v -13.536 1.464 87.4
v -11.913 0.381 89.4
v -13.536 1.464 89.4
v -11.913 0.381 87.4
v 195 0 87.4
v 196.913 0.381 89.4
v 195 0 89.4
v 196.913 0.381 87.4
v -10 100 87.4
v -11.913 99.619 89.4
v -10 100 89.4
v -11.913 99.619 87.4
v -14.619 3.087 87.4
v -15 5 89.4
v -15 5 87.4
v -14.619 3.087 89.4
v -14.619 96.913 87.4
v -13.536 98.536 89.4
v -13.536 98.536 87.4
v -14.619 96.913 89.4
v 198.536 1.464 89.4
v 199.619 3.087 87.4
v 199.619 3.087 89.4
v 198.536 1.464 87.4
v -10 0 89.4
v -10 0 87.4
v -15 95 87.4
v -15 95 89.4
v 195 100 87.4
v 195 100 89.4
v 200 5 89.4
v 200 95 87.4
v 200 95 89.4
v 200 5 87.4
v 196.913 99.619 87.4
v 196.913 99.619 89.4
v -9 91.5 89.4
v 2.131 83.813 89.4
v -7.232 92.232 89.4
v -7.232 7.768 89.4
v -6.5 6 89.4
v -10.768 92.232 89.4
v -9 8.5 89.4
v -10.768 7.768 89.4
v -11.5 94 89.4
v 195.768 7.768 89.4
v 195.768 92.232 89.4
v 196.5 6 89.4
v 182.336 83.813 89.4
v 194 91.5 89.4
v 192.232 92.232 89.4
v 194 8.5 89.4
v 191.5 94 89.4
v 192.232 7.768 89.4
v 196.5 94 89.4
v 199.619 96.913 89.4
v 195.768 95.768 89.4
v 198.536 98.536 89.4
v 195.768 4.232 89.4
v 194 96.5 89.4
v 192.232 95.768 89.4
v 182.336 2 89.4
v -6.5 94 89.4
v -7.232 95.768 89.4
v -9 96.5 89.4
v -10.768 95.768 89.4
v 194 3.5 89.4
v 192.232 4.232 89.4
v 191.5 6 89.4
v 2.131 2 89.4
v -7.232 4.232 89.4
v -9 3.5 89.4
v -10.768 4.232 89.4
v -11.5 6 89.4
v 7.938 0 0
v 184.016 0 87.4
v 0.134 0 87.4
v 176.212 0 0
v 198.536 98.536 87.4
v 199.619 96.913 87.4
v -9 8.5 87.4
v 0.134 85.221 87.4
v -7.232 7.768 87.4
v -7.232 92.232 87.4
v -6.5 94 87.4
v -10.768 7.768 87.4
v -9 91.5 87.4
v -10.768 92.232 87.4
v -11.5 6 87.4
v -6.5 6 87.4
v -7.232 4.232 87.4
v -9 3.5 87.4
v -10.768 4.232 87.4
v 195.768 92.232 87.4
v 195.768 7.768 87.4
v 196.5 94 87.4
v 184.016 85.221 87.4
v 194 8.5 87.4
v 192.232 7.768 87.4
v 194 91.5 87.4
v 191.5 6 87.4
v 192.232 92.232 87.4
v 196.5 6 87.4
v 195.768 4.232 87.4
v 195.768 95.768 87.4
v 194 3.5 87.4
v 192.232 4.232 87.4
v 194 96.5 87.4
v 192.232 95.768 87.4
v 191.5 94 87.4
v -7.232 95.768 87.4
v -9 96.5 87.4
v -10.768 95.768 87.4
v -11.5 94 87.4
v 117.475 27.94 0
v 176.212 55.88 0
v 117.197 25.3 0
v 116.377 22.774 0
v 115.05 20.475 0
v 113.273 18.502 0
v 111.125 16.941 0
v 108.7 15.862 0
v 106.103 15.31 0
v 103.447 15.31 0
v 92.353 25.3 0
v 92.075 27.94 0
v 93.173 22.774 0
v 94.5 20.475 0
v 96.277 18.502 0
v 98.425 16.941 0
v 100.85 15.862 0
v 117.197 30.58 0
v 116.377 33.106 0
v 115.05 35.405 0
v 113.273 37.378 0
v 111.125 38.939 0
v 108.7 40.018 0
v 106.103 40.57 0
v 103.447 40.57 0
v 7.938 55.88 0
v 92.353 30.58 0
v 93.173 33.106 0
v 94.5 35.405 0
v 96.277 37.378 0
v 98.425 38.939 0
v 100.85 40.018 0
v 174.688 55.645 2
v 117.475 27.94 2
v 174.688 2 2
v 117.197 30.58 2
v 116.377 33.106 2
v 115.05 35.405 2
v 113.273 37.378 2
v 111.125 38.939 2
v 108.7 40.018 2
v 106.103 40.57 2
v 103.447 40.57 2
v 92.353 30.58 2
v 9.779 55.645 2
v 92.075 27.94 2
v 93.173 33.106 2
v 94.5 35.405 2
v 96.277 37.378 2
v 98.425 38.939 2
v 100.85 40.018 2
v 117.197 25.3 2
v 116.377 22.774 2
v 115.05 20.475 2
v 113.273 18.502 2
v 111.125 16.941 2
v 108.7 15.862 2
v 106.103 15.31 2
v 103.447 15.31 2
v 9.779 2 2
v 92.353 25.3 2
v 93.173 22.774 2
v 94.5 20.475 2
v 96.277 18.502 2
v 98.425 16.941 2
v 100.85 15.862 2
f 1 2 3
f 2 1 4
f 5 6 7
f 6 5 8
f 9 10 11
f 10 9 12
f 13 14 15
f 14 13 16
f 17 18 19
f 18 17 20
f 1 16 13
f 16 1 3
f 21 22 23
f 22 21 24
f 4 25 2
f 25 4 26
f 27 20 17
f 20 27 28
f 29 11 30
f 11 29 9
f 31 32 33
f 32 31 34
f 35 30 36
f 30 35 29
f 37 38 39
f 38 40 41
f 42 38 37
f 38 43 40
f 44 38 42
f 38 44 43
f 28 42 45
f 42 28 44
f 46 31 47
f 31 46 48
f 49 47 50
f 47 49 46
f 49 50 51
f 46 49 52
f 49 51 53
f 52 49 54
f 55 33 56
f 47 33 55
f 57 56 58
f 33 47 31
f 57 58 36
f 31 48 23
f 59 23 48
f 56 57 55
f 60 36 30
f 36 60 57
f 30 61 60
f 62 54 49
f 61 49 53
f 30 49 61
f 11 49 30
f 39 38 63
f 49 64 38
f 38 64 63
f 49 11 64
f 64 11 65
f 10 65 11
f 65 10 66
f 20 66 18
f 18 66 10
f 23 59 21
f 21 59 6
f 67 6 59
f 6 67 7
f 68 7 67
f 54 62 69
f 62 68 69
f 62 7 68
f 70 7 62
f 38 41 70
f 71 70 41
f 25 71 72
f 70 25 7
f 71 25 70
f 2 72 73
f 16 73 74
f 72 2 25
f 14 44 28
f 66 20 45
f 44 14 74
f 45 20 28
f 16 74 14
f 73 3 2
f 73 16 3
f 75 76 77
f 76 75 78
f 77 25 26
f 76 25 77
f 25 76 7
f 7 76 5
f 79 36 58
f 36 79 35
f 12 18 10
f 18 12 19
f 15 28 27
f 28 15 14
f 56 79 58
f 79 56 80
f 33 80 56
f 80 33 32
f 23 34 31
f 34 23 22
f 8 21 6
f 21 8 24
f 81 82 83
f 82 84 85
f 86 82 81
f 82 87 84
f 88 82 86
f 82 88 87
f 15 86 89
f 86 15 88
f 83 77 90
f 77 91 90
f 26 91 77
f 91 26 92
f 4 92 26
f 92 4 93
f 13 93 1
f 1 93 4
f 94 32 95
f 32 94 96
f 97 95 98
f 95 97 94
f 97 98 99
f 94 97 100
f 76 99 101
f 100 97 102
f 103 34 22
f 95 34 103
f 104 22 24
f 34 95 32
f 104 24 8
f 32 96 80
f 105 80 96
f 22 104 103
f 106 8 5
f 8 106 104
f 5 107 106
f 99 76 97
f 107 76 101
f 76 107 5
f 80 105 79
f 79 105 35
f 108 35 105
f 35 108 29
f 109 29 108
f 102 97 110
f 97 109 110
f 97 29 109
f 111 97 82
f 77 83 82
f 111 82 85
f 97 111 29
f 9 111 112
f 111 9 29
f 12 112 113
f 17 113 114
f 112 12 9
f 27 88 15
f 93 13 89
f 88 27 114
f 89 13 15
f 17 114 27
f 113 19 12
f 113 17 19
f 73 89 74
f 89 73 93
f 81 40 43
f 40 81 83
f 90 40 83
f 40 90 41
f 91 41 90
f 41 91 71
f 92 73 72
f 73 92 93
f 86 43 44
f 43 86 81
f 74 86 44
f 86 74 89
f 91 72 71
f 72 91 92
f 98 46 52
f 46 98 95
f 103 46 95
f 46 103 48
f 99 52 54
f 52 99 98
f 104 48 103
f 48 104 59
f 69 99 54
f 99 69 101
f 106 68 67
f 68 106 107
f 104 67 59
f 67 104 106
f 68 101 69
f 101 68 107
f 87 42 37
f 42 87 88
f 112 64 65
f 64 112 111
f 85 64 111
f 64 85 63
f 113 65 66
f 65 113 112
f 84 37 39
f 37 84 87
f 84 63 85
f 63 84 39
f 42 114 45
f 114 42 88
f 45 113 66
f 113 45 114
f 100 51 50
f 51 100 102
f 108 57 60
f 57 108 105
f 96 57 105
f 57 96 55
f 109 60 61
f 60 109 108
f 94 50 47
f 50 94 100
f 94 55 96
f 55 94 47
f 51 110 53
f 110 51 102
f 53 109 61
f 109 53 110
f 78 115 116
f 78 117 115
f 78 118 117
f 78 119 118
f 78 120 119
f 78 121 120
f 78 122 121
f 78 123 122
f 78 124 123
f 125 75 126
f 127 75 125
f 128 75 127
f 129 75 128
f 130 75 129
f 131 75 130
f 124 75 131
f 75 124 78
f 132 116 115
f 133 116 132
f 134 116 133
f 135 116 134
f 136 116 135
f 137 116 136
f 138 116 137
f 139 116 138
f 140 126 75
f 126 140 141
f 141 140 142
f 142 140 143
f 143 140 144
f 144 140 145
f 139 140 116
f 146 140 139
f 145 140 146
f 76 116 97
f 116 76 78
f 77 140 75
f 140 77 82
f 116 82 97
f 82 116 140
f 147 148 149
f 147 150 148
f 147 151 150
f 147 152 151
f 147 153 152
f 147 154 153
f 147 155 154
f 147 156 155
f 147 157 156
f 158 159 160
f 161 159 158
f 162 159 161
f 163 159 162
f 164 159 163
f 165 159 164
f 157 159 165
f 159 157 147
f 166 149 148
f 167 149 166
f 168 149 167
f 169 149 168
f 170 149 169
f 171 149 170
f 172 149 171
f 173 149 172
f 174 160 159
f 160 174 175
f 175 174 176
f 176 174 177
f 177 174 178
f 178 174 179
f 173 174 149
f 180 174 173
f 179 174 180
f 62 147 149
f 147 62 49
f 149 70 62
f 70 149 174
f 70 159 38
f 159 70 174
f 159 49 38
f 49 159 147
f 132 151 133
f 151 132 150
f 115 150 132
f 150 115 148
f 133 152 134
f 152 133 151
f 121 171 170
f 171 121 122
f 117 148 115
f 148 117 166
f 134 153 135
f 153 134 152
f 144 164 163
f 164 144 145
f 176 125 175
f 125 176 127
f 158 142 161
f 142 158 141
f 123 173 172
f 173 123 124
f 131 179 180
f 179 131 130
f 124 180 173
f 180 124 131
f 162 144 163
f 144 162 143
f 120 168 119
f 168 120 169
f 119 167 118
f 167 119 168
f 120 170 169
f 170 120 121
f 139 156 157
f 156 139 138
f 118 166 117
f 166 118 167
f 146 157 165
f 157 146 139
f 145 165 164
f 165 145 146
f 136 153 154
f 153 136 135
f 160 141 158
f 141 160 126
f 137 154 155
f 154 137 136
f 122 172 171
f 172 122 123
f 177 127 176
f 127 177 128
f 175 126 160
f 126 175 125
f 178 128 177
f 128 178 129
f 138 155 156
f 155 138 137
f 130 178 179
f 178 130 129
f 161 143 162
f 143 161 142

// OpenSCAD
// Box to fit some controls into an odd space in a kayak

mmIn = 25.4;

boxHeight = 3.5 * mmIn;
boxBottomWidth = 6.625 * mmIn;
boxTopWidth = 7.25 * mmIn;
boxBottomDepth = 2.2 * mmIn;
BoxTopDepth = 3.375 * mmIn;

boxBottomOffset = (boxTopWidth - boxBottomWidth) / 2;

boxPoints = [
    [boxBottomOffset, 0, 0],
    [boxBottomOffset + boxBottomWidth, 0, 0],
    [boxBottomOffset + boxBottomWidth, boxBottomDepth, 0],
    [boxBottomOffset, boxBottomDepth, 0],
    [0, 0, boxHeight],
    [boxTopWidth, 0, boxHeight],
    [boxTopWidth, BoxTopDepth, boxHeight],
    [0, BoxTopDepth, boxHeight],
  ];

boxFaces = [
    [0, 1, 2, 3], // Bottom
    [4, 5, 1, 0], // Front
    [7, 6, 5, 4], // Top
    [5, 6, 2, 1], // Right
    [6, 7, 3, 2], // Back
    [7, 4, 0, 3], // Left
  ];

difference() {
    // Join box and flange
    union(){
        polyhedron(
            points = boxPoints,
            faces = boxFaces);
        lid();
    }
    // Hollow out box
    translate([2, 2, 2])
        scale([0.98, 0.96, 1])
            polyhedron(points = boxPoints, faces = boxFaces);
    // Wiring Hole
    translate([
        boxTopWidth/2 + 0.5*mmIn,
        boxBottomDepth/2,
        0])
        cylinder(
            r=0.5*mmIn,
            h=5,
            center=true);
}


LidWidth = 210;
LidDepth = 95;
LidHeight = 1;
CornerRad = 5;
CornerHoleOffset = 6;
MountHole = 5 / 2;

module lid() {
    translate([-10, 5, boxHeight - LidHeight]){
        difference(){
            // Rounded corners
            minkowski(){
                cube([
                    LidWidth - CornerRad,
                    LidDepth - CornerRad,
                    LidHeight]);
                cylinder(
                    r=CornerRad,
                    h=LidHeight,
                    center=true);
            };
            
            // Mounting Holes
            translate([1, 1, -1])
                cylinder(
                    r=MountHole,
                    h=LidHeight + 2);
            translate([LidWidth - 6, 1, -1])
                cylinder(
                    r=MountHole,
                    h=LidHeight + 2);
            translate([1, LidDepth - 6, -1])
                cylinder(
                    r=MountHole,
                    h=LidHeight + 2);
            translate([
                LidWidth - 6,
                LidDepth - 6,
                -1])
                cylinder(
                    r=MountHole,
                    h=LidHeight + 2);    
        }
    }
}
